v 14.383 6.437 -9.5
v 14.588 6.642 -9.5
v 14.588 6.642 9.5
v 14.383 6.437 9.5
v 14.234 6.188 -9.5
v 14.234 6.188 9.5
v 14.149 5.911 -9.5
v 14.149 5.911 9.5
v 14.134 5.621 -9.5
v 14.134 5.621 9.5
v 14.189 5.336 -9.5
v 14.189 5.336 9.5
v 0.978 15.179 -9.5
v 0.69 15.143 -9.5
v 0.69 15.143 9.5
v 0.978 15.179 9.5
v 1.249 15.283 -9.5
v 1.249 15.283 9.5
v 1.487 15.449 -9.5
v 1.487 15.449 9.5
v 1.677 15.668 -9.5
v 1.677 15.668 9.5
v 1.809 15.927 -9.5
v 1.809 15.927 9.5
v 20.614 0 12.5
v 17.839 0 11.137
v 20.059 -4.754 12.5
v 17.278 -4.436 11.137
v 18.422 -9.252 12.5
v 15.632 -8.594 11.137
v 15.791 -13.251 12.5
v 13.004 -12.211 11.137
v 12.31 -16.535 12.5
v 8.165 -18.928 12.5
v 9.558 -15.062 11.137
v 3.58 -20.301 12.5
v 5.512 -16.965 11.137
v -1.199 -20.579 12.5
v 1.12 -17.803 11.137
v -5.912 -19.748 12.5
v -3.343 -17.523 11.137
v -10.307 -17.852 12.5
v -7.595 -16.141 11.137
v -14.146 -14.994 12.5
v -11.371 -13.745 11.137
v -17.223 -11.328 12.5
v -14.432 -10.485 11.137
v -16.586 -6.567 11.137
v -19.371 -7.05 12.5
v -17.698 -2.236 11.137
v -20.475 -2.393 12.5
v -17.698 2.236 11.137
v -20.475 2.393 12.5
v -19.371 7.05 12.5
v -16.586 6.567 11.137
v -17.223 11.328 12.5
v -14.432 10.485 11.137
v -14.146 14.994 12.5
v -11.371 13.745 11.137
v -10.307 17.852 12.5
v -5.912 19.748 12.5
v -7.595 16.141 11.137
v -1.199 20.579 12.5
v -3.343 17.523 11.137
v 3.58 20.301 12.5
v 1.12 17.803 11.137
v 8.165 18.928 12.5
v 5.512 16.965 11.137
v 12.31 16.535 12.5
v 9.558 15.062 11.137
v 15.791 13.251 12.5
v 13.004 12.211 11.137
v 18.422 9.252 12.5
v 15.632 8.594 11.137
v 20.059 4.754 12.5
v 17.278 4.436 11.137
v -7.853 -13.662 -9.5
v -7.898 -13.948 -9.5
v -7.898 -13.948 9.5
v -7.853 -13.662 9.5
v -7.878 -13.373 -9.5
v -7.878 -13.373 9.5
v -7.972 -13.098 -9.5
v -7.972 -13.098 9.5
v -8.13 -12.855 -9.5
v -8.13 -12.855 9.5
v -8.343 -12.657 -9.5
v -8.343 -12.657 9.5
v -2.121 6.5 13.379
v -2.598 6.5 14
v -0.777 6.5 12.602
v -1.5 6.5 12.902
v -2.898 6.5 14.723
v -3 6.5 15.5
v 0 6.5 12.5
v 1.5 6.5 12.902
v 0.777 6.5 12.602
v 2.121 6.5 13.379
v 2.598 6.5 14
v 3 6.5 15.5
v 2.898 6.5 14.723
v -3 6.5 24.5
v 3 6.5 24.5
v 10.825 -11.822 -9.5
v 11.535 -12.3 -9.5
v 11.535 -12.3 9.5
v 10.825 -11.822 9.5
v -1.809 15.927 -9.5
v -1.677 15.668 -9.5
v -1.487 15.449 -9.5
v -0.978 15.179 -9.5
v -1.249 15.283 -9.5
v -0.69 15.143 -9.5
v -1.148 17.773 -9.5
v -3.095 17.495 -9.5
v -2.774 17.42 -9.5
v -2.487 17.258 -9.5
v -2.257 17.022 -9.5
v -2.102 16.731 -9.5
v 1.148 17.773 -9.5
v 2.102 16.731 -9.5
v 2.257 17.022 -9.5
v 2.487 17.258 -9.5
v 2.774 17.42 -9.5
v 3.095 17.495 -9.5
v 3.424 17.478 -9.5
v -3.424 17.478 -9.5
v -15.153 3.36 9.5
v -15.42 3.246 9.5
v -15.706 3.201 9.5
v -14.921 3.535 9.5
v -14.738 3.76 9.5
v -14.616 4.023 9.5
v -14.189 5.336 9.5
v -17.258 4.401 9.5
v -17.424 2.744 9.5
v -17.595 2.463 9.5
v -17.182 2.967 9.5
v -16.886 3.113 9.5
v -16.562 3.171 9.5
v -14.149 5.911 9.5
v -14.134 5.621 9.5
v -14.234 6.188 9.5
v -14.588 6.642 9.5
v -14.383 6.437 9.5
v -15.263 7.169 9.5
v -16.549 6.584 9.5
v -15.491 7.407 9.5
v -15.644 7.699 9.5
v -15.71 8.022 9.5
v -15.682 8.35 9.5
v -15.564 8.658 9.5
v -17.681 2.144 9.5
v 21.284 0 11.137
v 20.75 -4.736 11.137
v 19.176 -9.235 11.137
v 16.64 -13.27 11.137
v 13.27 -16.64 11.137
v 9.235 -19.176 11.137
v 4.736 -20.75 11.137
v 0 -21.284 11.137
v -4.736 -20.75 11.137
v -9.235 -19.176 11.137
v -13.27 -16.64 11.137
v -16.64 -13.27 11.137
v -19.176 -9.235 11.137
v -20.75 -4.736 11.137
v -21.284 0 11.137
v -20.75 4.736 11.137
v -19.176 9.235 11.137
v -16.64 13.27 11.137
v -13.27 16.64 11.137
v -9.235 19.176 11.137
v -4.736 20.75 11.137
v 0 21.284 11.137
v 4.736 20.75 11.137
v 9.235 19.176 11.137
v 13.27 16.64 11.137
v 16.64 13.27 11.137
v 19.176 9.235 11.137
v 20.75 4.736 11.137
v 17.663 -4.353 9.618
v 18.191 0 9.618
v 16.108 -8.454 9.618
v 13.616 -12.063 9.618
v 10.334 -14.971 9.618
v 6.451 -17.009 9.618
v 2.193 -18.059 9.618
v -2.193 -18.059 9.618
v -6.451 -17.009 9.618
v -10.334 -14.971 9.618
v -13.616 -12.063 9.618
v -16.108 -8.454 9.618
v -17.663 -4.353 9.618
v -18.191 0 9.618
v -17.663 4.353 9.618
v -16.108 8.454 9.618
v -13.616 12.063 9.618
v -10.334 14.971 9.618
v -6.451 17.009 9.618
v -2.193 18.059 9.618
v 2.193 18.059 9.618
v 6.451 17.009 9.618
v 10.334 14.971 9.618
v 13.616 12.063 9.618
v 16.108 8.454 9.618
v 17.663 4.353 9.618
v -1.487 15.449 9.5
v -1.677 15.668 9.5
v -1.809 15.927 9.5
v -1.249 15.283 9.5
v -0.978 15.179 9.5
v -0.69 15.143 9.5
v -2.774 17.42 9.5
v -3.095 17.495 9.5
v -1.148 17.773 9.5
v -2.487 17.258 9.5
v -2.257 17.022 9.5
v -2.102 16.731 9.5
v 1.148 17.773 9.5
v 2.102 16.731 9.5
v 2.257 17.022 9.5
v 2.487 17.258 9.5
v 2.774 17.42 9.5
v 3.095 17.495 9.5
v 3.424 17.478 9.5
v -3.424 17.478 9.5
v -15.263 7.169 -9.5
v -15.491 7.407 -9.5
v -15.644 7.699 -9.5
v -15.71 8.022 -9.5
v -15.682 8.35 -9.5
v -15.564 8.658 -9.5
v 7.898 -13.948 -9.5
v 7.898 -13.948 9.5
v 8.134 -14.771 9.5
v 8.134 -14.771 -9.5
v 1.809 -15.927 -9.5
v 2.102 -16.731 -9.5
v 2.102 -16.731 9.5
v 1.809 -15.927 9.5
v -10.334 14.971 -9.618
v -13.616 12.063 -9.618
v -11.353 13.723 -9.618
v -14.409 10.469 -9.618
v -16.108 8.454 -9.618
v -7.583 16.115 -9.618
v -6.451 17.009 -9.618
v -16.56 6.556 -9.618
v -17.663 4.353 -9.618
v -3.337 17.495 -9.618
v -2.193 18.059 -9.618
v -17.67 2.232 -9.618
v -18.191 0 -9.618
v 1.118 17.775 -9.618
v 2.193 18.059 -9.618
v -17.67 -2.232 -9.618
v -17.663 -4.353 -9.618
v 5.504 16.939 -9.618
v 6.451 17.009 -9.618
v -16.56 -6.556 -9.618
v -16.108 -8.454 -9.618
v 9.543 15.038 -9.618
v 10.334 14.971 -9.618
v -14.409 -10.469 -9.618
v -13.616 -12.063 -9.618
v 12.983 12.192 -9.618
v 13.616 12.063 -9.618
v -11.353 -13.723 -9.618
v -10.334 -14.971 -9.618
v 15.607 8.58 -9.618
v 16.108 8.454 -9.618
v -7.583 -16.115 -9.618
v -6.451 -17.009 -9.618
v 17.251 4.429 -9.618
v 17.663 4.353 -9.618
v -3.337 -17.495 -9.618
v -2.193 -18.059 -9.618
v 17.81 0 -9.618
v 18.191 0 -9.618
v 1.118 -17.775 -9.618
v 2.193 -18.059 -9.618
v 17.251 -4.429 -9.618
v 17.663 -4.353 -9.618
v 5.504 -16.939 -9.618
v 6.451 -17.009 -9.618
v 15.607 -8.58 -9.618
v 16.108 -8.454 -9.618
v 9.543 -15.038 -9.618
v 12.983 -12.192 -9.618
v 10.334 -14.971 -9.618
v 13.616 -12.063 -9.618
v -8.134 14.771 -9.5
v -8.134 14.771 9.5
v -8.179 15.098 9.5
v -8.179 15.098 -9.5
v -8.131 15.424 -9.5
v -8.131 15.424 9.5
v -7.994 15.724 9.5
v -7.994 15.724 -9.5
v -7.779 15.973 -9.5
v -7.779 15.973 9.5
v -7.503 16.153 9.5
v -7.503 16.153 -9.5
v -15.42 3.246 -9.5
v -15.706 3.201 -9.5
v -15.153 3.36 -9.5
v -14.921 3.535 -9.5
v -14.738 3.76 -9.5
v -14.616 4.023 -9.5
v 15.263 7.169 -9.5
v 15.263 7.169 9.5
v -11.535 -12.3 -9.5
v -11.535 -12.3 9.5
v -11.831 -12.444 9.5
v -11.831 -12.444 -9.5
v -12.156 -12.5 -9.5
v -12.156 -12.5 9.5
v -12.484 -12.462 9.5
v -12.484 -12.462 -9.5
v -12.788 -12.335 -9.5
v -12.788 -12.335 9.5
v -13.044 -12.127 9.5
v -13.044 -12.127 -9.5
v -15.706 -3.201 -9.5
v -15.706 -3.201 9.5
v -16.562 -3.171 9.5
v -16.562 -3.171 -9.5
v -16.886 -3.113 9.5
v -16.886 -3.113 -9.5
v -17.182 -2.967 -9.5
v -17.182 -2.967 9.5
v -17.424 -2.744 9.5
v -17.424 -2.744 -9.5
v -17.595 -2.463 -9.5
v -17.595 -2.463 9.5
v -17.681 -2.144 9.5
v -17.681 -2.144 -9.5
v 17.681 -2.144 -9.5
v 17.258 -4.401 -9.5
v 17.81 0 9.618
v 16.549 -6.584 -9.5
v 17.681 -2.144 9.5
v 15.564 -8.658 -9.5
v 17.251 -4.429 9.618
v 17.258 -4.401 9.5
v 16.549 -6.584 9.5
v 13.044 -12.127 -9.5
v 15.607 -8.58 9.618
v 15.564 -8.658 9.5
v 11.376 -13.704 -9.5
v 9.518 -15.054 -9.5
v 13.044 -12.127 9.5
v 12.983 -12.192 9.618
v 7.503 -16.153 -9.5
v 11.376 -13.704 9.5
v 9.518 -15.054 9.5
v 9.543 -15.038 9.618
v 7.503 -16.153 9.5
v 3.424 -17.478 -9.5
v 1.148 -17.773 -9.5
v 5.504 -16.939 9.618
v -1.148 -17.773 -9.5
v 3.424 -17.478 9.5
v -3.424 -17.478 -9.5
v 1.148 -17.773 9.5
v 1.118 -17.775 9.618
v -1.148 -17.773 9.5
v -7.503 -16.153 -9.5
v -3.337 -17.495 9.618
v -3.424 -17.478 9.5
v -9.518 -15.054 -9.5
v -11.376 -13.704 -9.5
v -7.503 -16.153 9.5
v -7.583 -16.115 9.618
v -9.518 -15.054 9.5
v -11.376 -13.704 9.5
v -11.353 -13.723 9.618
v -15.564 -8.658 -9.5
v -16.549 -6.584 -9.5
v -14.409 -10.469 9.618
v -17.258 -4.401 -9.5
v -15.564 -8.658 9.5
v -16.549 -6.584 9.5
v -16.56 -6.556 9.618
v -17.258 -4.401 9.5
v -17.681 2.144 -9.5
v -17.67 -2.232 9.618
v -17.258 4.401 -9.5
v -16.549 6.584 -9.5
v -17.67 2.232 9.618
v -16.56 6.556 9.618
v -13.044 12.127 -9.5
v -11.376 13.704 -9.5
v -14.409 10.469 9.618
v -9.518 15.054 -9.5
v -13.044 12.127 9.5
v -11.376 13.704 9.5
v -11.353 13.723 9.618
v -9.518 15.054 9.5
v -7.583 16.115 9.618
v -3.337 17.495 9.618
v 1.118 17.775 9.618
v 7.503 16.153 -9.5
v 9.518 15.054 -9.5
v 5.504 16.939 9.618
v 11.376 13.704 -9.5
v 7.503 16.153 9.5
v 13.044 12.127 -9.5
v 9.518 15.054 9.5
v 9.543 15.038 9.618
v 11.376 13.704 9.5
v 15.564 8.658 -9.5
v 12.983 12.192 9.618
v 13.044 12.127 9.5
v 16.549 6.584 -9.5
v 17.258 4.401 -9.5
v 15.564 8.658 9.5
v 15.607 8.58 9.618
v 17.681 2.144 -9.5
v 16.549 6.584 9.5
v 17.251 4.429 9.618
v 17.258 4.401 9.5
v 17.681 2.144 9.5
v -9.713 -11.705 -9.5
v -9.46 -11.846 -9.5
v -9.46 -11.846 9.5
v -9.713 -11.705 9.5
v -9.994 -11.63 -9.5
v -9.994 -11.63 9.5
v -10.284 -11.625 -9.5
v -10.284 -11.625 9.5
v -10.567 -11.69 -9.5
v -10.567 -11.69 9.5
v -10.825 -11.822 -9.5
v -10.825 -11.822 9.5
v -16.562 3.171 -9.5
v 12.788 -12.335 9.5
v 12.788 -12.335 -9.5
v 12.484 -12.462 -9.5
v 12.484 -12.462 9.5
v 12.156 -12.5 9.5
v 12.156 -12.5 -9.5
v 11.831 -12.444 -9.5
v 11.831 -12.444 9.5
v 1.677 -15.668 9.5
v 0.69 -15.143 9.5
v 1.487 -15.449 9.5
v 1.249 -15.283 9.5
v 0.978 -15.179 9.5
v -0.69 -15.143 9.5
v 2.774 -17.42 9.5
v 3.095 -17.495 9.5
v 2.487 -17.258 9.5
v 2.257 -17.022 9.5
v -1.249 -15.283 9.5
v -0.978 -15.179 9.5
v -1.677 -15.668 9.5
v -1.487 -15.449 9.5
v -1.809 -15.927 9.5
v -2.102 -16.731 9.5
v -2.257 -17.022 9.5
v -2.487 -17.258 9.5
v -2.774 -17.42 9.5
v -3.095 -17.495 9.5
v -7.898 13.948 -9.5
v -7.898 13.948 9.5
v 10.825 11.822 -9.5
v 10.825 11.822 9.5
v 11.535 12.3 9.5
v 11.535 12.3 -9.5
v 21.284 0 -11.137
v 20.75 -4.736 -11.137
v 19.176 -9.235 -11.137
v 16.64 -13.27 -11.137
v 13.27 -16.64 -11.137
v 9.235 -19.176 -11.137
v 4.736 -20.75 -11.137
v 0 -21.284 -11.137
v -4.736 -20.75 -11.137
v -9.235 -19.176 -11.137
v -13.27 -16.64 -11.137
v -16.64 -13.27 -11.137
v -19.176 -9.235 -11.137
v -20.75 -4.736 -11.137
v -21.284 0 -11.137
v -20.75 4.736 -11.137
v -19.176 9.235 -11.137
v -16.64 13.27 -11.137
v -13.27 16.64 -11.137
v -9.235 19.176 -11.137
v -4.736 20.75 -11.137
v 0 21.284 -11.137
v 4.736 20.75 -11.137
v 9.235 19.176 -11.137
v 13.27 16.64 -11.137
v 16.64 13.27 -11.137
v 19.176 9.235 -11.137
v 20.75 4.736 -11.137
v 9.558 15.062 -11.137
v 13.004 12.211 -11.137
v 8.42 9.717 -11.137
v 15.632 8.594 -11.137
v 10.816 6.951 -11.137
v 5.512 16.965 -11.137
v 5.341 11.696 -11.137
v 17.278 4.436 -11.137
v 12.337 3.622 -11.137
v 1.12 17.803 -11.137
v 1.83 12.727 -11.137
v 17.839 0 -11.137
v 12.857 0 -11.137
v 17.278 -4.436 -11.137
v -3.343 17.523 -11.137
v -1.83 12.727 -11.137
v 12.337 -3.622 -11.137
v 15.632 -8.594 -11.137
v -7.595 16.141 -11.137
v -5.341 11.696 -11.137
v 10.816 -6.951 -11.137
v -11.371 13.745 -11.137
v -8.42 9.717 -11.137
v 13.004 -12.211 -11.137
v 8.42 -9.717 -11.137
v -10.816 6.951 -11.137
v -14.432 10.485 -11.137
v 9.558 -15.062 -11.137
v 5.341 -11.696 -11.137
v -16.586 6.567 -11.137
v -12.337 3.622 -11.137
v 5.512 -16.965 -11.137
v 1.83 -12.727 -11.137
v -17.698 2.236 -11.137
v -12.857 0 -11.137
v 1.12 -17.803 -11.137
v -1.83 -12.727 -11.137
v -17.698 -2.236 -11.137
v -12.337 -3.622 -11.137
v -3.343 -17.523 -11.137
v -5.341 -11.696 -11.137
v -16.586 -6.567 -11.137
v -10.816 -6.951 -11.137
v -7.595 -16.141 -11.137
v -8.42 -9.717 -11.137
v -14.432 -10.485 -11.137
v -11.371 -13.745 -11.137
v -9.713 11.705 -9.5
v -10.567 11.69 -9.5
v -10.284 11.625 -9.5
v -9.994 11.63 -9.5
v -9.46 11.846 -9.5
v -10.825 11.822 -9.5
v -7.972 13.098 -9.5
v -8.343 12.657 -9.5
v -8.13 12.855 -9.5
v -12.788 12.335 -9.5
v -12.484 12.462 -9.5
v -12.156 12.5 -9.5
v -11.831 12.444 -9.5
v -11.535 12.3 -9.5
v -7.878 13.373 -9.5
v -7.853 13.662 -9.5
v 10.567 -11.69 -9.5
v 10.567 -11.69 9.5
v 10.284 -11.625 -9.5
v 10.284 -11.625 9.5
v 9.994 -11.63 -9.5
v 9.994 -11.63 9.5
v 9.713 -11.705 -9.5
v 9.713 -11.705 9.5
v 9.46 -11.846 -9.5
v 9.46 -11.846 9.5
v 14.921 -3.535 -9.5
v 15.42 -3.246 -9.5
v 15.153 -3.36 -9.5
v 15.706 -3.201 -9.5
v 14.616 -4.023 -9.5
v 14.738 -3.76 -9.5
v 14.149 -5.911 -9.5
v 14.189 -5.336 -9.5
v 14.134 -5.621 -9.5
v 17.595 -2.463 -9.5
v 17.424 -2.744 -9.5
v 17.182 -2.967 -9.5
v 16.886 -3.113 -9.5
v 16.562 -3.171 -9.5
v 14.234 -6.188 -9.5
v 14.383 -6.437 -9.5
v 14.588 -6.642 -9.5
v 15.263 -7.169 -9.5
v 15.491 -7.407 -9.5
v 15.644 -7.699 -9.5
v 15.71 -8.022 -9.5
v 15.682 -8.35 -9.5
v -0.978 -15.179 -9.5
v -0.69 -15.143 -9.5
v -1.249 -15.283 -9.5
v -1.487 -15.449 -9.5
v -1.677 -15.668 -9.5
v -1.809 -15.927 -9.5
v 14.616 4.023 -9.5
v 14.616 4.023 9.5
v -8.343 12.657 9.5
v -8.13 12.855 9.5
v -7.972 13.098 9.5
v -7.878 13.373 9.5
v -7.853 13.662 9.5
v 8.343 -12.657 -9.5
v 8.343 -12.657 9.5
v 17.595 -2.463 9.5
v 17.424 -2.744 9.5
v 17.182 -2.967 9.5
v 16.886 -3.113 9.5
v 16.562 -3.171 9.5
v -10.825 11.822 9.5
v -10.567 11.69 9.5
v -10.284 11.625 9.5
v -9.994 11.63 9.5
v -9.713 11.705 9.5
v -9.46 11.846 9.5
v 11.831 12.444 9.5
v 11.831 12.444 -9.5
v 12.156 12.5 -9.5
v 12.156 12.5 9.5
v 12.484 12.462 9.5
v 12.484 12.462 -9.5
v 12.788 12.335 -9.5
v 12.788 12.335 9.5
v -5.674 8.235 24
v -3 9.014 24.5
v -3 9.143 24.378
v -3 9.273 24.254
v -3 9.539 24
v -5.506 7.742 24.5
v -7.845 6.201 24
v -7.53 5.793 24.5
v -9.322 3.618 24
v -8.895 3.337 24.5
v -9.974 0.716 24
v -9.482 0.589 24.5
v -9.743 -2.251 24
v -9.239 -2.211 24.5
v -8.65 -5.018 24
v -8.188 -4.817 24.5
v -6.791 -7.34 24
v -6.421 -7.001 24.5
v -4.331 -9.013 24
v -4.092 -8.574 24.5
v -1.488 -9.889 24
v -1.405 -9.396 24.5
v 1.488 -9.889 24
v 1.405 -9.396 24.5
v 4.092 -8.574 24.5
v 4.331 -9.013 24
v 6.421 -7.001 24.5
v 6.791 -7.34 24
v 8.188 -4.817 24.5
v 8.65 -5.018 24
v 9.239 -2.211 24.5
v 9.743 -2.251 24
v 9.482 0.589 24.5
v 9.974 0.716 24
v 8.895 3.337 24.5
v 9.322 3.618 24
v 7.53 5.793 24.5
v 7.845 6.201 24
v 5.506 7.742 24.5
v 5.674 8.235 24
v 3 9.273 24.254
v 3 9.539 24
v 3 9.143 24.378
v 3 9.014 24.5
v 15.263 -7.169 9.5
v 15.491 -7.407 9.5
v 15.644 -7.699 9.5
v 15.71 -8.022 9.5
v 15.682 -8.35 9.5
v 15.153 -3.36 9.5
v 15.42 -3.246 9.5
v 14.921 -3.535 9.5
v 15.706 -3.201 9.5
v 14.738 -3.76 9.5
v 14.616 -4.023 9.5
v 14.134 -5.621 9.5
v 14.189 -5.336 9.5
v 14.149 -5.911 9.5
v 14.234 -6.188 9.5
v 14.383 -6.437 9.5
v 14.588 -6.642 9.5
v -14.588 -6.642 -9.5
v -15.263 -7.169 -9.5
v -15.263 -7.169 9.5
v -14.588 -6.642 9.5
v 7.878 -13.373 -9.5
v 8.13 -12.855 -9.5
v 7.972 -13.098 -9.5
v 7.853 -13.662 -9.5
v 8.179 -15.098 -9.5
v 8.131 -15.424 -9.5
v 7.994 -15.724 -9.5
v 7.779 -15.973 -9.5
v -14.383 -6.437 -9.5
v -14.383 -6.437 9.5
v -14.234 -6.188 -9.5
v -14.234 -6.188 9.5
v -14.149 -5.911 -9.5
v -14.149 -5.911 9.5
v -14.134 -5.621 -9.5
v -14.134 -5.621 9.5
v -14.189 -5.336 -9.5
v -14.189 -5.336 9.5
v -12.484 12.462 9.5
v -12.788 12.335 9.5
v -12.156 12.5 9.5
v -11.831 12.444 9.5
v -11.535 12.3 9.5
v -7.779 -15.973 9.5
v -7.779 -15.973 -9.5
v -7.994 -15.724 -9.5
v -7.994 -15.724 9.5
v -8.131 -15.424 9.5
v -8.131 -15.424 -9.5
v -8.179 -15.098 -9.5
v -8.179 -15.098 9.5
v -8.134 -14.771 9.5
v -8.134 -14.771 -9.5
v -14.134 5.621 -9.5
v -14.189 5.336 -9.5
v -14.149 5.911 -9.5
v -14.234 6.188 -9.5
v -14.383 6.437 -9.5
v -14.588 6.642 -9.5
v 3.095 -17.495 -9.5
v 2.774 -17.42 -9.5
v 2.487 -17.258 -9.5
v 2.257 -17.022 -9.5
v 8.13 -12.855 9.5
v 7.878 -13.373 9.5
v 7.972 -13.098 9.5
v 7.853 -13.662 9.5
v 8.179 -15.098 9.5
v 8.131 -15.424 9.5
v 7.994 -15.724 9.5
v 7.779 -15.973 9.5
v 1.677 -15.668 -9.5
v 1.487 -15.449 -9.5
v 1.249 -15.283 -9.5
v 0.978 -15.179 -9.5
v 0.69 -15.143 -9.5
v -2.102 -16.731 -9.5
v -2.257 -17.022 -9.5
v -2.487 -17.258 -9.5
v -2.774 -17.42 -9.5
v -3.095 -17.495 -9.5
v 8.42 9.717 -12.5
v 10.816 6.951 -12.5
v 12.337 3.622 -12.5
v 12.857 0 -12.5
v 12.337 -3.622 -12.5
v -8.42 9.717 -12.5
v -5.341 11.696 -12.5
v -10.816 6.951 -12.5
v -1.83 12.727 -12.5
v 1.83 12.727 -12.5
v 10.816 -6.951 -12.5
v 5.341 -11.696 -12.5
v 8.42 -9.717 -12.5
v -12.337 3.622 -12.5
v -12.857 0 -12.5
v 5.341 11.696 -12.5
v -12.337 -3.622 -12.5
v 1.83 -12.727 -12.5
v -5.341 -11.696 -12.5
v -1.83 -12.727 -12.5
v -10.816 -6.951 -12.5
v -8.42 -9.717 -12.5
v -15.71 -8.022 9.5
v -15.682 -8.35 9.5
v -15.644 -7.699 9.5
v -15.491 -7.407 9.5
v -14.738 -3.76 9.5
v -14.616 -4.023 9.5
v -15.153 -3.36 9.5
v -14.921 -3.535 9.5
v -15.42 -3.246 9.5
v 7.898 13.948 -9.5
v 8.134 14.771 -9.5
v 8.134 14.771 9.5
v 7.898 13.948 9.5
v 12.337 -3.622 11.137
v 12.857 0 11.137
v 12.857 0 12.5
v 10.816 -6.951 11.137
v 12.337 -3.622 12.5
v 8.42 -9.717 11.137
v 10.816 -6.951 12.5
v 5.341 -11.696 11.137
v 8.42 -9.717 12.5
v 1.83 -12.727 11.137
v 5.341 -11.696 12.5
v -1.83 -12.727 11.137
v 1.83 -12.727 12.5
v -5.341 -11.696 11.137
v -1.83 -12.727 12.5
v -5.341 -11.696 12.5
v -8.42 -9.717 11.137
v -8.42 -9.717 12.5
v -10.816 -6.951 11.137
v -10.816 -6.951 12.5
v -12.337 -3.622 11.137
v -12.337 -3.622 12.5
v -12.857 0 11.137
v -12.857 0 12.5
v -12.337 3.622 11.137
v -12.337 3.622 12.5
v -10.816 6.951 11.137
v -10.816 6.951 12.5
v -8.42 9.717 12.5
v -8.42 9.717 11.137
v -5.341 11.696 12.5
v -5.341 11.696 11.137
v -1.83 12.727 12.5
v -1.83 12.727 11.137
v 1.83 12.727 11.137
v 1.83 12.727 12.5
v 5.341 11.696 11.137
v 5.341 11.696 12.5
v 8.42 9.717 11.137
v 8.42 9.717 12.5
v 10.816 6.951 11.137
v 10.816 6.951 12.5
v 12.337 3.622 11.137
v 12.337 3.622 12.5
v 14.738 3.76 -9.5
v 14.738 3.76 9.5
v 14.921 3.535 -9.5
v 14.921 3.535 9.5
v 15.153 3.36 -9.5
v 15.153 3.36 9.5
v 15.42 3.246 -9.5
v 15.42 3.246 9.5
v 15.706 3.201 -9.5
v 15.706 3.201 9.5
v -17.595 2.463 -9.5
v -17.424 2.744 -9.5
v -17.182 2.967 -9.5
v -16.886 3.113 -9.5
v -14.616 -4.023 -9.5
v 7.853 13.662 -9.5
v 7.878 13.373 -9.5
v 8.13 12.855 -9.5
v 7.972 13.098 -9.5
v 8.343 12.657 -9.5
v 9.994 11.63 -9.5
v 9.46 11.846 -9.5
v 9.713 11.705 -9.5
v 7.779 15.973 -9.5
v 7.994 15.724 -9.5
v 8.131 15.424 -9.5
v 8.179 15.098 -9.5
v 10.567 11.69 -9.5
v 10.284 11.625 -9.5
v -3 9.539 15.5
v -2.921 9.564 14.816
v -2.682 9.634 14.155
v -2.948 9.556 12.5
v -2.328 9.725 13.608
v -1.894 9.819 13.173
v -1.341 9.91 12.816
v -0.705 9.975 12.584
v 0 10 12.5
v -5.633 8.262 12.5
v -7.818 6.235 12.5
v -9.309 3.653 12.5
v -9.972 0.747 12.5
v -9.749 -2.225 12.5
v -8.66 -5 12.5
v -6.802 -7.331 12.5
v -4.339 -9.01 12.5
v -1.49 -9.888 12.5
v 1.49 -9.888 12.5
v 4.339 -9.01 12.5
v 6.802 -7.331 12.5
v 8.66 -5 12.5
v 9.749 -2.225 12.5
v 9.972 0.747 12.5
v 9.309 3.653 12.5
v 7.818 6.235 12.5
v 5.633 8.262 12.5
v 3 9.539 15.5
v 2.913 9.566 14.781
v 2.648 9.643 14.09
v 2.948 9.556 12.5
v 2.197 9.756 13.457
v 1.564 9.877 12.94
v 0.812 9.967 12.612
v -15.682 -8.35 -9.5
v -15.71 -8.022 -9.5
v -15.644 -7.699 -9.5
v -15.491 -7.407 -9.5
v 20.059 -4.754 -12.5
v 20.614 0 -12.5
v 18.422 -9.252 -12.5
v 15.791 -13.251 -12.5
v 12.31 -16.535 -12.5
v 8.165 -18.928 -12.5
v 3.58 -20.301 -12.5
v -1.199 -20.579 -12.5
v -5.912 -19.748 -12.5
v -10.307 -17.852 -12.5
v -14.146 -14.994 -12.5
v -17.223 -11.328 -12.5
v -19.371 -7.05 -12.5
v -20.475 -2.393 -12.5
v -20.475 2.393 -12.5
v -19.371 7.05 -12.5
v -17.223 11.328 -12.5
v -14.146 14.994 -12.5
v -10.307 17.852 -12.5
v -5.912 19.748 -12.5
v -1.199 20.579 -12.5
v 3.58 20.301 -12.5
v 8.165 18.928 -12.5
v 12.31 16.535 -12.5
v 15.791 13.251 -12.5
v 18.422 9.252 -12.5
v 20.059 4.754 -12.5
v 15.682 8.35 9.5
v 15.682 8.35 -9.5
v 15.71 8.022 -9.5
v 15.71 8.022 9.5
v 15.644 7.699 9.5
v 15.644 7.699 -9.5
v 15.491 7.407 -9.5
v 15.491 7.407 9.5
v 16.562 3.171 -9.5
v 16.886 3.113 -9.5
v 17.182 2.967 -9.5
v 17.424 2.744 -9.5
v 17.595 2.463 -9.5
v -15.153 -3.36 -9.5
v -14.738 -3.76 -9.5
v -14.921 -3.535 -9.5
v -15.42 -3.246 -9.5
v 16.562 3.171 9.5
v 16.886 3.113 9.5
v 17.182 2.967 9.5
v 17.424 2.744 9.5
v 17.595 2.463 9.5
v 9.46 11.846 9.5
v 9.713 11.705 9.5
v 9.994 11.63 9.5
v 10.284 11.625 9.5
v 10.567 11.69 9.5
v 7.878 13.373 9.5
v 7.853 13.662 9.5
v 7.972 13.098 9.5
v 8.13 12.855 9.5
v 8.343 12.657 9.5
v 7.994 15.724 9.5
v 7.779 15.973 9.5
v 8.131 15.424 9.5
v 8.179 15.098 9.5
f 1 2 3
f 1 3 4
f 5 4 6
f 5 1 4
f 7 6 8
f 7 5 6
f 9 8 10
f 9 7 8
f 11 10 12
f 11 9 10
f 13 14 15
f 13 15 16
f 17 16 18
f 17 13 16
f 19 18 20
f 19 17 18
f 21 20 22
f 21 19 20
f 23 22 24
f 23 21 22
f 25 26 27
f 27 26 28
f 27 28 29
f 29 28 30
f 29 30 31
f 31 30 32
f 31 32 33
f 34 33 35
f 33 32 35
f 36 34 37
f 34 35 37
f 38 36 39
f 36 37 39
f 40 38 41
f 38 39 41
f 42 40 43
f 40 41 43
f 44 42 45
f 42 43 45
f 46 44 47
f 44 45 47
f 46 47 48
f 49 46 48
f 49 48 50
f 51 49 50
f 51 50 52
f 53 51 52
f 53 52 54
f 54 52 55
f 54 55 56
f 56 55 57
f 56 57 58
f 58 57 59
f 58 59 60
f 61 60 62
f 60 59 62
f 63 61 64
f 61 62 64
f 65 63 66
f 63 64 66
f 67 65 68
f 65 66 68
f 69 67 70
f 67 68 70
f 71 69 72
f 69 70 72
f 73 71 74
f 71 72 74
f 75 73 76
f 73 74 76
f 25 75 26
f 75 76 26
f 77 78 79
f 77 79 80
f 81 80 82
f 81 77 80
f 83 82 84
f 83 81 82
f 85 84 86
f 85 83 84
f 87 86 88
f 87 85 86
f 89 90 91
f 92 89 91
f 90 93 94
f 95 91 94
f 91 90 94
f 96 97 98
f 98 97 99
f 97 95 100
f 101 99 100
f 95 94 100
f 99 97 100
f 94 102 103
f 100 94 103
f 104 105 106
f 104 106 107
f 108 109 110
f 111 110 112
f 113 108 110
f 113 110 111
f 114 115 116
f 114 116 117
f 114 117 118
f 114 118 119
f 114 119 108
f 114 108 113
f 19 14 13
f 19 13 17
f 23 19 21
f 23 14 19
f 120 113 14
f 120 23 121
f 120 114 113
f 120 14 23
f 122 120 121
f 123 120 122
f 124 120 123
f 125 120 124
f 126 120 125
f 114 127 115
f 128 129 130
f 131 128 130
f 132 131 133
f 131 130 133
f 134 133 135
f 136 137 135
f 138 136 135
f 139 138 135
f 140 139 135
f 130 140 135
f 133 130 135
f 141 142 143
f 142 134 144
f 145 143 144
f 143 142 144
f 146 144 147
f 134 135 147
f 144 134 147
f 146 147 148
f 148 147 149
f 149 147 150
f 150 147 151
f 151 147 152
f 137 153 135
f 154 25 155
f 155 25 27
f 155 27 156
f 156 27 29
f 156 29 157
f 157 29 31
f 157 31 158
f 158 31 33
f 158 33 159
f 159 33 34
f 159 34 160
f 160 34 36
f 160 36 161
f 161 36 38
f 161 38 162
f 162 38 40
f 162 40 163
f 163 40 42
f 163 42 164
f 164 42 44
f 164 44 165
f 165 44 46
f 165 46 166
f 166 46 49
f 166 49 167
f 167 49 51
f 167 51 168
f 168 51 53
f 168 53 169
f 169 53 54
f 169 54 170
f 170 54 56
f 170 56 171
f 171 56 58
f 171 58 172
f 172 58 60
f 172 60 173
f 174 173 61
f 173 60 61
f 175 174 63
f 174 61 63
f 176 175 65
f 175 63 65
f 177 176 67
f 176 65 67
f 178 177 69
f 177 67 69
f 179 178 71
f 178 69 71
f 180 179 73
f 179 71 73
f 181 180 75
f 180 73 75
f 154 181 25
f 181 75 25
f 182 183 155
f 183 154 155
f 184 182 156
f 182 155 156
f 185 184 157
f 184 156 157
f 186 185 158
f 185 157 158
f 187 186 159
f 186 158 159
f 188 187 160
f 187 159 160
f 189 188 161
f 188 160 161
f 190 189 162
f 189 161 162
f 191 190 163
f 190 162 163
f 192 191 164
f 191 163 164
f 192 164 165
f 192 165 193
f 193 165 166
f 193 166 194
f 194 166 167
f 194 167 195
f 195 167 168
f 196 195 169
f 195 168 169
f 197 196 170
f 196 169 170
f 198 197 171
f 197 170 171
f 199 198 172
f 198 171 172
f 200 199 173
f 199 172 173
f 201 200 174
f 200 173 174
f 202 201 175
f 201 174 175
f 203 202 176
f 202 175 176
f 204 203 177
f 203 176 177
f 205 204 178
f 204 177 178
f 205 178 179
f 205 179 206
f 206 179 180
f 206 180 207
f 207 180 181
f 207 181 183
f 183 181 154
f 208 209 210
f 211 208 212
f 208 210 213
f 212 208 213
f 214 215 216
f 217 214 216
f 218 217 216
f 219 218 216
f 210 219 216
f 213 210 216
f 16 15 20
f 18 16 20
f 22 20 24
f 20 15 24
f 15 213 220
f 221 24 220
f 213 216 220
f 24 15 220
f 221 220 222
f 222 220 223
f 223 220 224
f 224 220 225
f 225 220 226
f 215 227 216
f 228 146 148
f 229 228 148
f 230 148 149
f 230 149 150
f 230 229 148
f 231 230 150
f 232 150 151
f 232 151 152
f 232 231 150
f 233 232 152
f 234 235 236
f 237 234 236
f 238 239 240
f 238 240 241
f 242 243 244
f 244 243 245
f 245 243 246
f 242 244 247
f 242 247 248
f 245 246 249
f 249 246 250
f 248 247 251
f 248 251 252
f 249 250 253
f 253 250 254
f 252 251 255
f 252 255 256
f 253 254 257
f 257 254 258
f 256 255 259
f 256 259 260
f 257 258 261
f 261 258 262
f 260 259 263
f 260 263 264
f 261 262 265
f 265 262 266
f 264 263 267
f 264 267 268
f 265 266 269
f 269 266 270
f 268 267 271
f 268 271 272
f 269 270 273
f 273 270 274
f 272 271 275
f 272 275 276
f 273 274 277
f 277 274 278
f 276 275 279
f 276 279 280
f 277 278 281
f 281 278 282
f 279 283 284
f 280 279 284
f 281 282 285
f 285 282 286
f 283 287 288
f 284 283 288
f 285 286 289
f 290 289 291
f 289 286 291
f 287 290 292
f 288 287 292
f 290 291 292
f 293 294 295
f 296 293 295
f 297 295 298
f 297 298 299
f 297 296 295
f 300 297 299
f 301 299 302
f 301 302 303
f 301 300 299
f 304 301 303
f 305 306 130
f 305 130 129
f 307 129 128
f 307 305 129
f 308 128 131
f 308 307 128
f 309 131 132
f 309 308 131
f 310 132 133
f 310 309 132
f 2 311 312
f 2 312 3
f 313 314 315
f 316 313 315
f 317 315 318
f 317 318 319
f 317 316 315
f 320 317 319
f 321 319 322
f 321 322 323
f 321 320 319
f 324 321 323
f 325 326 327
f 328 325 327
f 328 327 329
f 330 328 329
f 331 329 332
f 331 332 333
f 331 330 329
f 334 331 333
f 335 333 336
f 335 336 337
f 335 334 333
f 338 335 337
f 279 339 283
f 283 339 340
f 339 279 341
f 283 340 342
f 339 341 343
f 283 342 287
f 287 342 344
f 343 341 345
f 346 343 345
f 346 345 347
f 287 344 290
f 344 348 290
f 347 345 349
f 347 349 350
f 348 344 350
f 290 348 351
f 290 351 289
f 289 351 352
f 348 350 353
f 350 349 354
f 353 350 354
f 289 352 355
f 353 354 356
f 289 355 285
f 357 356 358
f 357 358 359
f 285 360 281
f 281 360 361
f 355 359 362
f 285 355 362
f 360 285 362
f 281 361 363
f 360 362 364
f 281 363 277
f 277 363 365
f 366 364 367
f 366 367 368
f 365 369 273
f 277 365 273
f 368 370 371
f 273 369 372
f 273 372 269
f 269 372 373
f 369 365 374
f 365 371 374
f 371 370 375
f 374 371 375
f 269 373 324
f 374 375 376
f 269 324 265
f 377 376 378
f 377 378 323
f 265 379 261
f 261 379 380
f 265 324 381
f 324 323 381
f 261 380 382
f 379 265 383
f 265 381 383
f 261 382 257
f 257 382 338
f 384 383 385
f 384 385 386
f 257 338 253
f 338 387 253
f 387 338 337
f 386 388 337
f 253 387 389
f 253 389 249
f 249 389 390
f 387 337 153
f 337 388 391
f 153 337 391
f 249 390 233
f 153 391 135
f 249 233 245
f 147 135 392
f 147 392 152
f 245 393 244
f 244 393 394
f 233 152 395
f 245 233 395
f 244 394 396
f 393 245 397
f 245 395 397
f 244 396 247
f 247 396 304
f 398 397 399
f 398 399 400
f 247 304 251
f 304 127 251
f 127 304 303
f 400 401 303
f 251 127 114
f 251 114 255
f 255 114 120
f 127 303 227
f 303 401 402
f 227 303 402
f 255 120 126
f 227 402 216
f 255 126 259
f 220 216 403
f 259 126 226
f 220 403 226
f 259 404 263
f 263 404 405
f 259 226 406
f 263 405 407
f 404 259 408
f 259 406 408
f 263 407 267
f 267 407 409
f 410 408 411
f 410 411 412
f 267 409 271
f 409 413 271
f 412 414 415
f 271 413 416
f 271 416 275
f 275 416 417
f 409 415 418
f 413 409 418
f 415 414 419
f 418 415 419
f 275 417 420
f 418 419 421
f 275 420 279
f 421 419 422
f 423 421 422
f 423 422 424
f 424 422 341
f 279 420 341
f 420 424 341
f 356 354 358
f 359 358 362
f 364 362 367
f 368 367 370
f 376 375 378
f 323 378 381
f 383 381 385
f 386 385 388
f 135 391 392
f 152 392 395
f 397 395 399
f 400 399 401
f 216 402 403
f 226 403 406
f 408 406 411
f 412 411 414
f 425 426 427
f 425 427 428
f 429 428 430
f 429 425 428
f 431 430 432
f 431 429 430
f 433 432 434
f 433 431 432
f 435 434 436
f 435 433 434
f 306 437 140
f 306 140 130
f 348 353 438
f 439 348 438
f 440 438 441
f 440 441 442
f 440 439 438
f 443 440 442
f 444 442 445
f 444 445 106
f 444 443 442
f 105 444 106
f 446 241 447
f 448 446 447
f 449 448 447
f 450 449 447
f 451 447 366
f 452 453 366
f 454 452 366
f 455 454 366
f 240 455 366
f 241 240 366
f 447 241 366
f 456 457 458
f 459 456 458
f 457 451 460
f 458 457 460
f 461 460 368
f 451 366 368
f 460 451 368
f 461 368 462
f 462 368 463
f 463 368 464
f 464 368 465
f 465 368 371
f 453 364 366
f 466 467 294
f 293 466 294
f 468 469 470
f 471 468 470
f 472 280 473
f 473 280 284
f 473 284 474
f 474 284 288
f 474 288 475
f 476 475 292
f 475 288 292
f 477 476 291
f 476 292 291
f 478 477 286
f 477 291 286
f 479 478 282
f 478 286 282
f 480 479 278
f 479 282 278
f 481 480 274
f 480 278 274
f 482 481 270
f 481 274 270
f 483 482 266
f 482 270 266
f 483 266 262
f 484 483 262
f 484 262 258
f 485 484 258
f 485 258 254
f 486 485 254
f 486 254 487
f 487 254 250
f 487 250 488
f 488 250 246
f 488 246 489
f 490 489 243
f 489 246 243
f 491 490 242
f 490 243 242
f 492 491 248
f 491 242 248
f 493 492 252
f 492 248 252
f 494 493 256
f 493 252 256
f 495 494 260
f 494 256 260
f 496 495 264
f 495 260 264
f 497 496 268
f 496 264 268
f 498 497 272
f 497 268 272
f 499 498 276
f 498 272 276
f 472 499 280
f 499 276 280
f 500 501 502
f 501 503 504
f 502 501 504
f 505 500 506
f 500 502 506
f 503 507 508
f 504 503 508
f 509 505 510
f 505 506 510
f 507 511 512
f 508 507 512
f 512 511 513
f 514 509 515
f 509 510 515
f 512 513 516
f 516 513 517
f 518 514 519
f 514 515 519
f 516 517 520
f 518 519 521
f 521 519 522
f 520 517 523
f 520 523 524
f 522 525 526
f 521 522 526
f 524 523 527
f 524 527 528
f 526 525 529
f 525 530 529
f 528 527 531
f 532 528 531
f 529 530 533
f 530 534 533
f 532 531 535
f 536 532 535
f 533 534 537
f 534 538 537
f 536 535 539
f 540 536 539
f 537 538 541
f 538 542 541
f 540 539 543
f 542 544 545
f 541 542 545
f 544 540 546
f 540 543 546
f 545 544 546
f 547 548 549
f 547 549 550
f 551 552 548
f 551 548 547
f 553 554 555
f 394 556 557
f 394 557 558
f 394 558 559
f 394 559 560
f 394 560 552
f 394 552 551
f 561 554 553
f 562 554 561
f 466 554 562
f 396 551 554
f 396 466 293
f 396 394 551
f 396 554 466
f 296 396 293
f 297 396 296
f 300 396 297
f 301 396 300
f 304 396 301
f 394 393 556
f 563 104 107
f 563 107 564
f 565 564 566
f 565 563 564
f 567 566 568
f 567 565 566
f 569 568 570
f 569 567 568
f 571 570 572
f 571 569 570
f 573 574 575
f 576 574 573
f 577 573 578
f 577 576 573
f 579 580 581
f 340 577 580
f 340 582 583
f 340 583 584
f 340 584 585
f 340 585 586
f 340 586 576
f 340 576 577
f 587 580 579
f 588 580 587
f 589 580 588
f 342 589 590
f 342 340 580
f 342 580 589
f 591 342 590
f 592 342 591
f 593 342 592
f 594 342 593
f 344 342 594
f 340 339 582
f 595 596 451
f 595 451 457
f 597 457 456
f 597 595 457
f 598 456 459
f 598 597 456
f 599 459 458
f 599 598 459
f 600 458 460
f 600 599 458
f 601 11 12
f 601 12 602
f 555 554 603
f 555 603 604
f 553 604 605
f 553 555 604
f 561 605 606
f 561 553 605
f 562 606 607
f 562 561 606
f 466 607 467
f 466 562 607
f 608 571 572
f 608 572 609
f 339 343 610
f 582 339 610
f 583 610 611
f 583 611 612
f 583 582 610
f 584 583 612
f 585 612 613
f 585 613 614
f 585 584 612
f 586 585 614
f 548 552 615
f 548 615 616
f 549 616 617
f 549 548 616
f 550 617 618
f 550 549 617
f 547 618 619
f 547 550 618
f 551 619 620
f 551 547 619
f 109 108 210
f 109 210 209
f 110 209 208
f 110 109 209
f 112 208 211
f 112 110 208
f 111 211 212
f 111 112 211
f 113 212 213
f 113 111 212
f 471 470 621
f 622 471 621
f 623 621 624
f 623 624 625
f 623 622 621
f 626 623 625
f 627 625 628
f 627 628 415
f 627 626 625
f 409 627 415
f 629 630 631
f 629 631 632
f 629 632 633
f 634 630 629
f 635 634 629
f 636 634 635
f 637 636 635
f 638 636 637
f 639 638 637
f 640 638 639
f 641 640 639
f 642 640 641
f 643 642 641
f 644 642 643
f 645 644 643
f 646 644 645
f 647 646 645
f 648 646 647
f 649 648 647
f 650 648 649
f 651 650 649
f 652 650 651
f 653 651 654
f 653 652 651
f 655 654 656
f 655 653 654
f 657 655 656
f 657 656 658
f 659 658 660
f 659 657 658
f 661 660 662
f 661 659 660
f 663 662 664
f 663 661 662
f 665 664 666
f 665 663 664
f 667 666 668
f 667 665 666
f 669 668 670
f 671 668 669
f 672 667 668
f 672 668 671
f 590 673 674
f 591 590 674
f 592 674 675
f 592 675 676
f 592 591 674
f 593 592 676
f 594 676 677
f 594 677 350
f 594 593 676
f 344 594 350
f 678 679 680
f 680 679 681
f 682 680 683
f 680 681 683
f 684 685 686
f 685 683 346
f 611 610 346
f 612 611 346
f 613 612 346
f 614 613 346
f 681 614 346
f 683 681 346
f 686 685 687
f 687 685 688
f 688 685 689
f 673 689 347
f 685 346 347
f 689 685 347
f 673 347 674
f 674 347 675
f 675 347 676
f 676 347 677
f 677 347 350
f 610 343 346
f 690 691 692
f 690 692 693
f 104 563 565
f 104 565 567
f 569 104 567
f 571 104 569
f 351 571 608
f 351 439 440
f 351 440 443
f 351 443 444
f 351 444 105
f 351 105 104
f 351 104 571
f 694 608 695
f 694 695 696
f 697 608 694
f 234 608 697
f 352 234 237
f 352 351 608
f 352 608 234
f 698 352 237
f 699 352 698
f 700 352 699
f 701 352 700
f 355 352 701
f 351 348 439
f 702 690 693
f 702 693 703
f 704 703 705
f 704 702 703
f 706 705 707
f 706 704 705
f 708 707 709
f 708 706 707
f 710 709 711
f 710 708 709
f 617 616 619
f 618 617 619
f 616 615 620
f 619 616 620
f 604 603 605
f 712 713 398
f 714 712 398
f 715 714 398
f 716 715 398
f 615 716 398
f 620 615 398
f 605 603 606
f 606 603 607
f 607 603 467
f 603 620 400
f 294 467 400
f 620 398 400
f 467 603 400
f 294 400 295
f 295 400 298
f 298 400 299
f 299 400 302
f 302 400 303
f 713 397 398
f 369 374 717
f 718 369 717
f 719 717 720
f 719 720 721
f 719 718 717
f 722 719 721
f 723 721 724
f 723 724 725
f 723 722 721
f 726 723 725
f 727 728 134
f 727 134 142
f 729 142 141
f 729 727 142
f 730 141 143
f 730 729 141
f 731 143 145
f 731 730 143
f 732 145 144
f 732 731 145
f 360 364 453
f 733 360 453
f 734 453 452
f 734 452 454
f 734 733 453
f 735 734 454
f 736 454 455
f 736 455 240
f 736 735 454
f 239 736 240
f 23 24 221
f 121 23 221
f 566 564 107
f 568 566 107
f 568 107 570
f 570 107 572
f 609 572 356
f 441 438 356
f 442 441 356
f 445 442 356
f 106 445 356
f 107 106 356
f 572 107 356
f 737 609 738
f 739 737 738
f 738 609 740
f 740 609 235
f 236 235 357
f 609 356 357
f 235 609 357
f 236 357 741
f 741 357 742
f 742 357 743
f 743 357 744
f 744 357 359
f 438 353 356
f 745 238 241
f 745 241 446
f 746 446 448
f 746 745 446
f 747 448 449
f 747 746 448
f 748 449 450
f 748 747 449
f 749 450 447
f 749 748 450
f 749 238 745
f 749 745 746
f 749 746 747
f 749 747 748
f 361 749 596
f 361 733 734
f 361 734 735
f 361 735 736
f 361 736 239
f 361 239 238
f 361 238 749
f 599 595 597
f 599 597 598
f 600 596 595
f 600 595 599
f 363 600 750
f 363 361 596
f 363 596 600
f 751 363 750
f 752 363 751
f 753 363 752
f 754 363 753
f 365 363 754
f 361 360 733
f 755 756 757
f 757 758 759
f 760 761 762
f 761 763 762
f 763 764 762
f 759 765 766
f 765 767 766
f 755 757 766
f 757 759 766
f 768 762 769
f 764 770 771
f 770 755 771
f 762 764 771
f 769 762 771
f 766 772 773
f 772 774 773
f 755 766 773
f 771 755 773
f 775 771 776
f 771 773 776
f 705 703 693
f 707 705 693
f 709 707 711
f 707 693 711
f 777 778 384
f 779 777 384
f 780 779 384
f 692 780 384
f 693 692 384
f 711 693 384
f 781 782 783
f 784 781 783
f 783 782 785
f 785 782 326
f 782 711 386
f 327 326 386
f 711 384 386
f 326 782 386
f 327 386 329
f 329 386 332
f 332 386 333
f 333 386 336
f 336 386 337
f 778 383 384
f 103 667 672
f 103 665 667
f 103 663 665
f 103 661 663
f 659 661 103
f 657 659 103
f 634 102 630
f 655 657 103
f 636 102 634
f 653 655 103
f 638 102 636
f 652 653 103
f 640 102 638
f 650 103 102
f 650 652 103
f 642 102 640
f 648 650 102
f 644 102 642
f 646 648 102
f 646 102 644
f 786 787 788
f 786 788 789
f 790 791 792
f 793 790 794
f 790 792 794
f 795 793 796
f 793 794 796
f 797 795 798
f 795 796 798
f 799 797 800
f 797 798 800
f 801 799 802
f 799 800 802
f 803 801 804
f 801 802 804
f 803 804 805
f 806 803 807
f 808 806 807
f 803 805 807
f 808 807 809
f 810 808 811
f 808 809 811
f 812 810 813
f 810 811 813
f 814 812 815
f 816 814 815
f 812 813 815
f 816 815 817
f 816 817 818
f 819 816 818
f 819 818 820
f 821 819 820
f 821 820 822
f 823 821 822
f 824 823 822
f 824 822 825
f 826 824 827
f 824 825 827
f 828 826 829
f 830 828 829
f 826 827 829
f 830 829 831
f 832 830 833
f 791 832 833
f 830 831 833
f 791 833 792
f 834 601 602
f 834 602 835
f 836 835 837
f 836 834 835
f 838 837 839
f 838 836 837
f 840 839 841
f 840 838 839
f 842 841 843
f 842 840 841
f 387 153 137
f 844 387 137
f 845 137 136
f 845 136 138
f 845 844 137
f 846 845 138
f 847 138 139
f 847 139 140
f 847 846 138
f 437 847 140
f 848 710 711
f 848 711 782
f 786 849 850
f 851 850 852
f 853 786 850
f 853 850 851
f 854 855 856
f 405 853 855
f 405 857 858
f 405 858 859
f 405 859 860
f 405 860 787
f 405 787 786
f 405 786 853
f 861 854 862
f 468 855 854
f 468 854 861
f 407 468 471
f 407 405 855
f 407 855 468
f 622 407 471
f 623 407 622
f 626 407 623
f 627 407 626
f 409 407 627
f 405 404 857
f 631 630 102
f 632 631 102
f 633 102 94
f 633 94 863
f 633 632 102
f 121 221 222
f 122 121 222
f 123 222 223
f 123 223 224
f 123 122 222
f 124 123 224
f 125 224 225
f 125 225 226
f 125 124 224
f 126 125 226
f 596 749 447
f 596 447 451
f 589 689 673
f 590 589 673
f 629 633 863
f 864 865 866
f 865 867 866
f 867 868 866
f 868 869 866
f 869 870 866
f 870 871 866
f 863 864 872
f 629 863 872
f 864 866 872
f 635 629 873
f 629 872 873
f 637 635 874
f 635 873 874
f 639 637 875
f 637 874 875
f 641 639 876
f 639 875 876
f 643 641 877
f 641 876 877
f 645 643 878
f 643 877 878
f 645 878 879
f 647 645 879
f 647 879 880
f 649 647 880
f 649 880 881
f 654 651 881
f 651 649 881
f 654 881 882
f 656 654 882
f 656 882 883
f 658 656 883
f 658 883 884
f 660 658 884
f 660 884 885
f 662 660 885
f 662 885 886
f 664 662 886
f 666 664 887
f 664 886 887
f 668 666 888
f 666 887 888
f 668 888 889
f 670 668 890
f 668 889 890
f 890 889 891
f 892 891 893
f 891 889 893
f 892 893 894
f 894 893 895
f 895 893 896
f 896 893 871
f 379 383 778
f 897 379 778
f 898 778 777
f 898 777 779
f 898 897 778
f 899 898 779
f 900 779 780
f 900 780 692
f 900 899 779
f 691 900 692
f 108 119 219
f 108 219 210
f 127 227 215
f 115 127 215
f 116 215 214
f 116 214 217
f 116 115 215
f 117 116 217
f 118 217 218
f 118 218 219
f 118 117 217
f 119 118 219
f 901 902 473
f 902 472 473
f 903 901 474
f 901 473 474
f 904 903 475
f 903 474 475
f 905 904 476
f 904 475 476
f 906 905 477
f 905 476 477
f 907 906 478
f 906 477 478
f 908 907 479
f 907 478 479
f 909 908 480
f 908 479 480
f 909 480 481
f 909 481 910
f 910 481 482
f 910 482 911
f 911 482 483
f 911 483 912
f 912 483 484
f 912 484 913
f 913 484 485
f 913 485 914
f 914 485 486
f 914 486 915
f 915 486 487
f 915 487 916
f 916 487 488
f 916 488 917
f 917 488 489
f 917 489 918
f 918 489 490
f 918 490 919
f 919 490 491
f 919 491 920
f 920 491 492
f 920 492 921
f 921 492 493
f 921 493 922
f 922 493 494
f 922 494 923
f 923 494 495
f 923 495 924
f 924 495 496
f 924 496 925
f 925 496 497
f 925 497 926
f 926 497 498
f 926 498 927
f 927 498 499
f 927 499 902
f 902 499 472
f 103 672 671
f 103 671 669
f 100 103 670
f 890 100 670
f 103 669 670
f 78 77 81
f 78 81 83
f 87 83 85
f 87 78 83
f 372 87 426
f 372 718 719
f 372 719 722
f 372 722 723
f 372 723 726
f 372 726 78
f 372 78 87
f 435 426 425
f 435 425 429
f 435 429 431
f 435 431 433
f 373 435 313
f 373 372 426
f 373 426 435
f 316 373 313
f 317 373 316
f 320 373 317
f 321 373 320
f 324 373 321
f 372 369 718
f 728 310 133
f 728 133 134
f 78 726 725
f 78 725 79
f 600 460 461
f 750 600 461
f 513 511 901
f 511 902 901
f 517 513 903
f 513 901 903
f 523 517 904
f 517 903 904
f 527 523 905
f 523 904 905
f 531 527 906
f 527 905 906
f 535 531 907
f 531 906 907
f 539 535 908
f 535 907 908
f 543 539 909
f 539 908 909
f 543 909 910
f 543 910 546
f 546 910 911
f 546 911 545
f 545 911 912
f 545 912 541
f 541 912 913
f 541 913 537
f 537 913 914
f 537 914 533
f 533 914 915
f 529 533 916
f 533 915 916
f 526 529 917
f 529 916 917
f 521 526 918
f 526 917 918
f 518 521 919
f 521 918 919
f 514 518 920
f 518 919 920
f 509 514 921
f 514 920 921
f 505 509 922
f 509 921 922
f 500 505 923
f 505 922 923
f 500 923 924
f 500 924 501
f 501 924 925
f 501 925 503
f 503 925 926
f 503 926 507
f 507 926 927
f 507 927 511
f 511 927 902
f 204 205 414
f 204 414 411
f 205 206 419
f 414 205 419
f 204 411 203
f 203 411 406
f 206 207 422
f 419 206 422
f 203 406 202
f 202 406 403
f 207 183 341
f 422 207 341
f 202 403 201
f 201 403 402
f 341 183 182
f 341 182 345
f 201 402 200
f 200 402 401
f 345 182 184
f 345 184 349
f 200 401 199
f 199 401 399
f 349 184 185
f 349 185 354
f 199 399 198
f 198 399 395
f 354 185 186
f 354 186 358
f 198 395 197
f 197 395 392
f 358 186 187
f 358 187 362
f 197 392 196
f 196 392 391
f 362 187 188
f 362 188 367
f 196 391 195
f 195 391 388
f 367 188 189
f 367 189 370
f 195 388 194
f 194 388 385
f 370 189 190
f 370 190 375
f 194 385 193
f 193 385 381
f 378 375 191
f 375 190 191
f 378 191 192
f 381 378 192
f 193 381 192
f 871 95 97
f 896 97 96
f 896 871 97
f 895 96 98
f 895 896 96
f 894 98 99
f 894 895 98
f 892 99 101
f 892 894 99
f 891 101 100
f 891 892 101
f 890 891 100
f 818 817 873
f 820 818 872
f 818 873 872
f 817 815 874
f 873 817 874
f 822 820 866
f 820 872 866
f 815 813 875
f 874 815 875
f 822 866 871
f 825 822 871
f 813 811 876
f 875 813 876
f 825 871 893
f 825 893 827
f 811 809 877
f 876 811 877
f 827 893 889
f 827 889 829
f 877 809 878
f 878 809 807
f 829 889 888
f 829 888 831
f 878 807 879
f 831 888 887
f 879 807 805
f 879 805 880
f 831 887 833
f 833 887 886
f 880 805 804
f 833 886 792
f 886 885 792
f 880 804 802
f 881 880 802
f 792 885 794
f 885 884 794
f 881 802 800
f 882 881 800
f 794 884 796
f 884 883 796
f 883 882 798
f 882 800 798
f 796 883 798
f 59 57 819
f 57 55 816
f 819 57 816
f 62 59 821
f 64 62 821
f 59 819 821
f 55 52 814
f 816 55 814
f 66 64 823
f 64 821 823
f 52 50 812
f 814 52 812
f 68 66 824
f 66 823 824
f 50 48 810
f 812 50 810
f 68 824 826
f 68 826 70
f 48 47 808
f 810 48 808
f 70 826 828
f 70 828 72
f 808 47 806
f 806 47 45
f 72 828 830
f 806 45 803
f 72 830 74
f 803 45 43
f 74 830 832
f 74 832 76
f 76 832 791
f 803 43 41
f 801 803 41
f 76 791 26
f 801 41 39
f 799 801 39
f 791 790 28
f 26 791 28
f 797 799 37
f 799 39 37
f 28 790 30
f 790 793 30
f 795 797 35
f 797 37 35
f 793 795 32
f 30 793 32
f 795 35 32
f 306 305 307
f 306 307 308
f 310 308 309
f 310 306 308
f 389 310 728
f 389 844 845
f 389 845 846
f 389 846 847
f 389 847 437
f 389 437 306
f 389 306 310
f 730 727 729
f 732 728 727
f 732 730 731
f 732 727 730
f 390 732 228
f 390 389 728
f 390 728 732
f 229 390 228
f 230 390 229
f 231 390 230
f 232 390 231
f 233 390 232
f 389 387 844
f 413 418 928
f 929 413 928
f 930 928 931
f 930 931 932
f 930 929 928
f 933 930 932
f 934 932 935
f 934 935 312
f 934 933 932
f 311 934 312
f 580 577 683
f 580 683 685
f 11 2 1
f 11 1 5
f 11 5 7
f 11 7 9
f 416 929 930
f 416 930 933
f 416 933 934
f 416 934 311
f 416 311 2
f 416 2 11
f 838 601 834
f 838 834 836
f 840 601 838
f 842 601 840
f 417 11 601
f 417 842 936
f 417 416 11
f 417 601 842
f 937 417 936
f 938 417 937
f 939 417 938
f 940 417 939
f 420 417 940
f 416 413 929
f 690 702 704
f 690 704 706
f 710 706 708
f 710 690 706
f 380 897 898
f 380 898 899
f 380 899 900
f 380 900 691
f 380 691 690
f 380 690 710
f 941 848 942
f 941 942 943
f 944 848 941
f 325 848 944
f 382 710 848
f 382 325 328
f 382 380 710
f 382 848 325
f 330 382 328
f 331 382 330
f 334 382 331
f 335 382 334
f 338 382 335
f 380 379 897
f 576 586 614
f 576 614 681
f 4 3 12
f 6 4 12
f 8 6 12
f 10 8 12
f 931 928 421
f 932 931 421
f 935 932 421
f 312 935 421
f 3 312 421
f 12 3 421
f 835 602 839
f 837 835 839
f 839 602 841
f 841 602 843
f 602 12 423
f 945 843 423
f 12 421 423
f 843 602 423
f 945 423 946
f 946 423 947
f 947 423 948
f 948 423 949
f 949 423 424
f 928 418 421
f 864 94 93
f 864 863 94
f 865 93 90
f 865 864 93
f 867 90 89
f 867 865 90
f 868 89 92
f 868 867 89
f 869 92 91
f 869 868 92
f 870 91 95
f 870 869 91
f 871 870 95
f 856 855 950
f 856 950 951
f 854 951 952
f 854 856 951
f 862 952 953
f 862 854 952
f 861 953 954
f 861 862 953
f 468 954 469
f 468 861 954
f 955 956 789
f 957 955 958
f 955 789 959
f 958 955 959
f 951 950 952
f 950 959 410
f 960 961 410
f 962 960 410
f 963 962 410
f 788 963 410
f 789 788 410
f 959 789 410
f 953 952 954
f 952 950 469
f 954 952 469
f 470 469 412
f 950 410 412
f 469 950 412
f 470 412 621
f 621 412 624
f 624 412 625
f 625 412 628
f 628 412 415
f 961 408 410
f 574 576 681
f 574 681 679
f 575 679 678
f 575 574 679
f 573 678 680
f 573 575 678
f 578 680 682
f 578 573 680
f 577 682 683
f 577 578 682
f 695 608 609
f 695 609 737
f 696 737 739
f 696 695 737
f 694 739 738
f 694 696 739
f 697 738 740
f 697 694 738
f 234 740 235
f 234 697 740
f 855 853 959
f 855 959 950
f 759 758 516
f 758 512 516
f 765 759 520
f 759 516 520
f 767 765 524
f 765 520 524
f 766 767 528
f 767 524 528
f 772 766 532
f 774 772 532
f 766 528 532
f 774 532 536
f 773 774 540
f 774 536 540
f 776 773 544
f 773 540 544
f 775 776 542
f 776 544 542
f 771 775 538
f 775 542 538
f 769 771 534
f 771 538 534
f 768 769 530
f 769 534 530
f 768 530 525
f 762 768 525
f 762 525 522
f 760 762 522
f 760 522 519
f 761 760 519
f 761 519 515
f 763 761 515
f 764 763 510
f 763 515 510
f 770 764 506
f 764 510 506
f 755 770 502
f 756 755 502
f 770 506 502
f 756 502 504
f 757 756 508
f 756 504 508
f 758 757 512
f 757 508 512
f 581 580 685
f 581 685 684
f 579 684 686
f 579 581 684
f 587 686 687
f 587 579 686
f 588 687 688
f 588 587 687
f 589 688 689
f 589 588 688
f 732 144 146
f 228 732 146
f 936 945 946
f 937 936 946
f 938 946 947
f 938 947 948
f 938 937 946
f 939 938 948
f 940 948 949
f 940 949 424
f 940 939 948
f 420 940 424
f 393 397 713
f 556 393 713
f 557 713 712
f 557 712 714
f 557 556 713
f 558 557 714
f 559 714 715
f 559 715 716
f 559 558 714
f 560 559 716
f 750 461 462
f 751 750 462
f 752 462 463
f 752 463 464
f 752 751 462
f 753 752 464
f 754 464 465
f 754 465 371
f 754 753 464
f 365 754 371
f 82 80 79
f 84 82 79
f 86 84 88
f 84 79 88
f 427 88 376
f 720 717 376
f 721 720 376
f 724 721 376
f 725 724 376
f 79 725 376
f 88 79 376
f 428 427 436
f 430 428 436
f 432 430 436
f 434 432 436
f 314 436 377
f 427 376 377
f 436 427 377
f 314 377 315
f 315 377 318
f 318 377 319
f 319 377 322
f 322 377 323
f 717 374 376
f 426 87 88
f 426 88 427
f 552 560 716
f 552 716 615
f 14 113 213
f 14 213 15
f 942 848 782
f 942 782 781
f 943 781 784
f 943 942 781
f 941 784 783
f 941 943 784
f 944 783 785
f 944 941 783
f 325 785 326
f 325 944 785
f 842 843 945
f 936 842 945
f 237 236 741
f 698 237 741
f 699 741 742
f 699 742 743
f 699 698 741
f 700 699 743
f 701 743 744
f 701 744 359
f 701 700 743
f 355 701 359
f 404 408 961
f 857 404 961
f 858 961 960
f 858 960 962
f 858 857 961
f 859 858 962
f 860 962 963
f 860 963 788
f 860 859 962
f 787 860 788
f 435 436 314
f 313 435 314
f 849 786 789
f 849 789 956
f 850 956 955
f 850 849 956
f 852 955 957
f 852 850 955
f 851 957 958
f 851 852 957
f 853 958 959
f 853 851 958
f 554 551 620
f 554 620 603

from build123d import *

# Parameters (mm, degrees)
TOOTH_EXTRUDE_START      = -9.5
TOOTH_EXTRUDE_DEPTH      = 19
PATTERN_CIRCULAR_1_COUNT = 10
SKETCH_3_R               = 10
EXTRUDE_1_DEPTH          = 12
CHAMFER_1_SIZE           = 0.5
SKETCH_4_W               = 6
SKETCH_4_H               = 7
CUT_EXTRUDE_1_DEPTH      = 12
FILLET_1_R               = 3


with BuildPart() as part:
    # GearBelt-BaseSketch → 0.375in Pitch 'L', 0.500in Belt Width, 36.3828mm P.D. (revolve)
    with BuildSketch(Plane(origin=(0, 0, 0), x_dir=(0, 0, -1), z_dir=(1, 0, 0)), mode=Mode.PRIVATE) as f_0_375in_pitch_l_0_500in_belt_width_36_sk:
        Polygon((-12.5, 0), (12.5, 0), (12.5, 12.857409477), (11.136655608, 12.857409477), (11.136655608, 17.838520326), (12.5, 20.614224723), (11.136655777, 21.283859322), (9.617735592, 18.191410003), (9.617735592, 17.810409995), (-9.617735592, 17.810409995), (-9.617735592, 18.191410003), (-11.136655777, 21.283859322), (-12.5, 20.614224723), (-11.136655608, 17.838520326), (-11.136655608, 12.857409477), (-12.5, 12.857409477), align=None)
    revolve(f_0_375in_pitch_l_0_500in_belt_width_36_sk.sketch.rotate(Axis((0, 0, 14.2875), (0, 0, -1)), 90), axis=Axis((0, 0, 14.2875), (0, 0, -1)))

    # Tooth-Sketch → Tooth-Extrude (cut)
    with BuildSketch(Plane.XY.offset(TOOTH_EXTRUDE_START)):
        with BuildLine():
            Line((-0.690315485, 15.14340994), (0.690315485, 15.14340994))
            ThreePointArc((0.690315485, 15.14340994), (1.373229902, 15.358732029), (1.809136966, 15.926817177))
            Line((1.809136966, 15.926817177), (2.101875716, 16.731110287))
            ThreePointArc((2.101875716, 16.731110287), (2.625223607, 17.348846453), (3.424464642, 17.478093321))
            Line((3.424464642, 17.478093321), (3.424464642, 20.018093321))
            Line((3.424464642, 20.018093321), (-3.424464642, 20.018093321))
            Line((-3.424464642, 20.018093321), (-3.424464642, 17.478093321))
            ThreePointArc((-3.424464642, 17.478093321), (-2.625223607, 17.348846453), (-2.101875716, 16.731110287))
            Line((-2.101875716, 16.731110287), (-1.809136966, 15.926817177))
            ThreePointArc((-1.809136966, 15.926817177), (-1.373229902, 15.358732029), (-0.690315485, 15.14340994))
        make_face()
    tooth_extrude = extrude(amount=TOOTH_EXTRUDE_DEPTH, mode=Mode.SUBTRACT)

    # 阵列(圆周)1: Tooth-Extrude ×10 about axis
    pattern_circular_1_axis = Axis((0, 0, 0), (0, 0, 1))
    for i in range(1, PATTERN_CIRCULAR_1_COUNT):
        add(tooth_extrude.rotate(pattern_circular_1_axis, i * 360 / PATTERN_CIRCULAR_1_COUNT), mode=Mode.SUBTRACT)

    # 草图3 → 凸台-拉伸1 (add)
    with BuildSketch(Plane.XY.offset(12.5)):
        with Locations(Location((0, 0, 0), (0, 0, 180))):
            Circle(SKETCH_3_R)
    extrude(amount=EXTRUDE_1_DEPTH)

    # 倒角1
    chamfer_1_edges = [part.edges().sort_by_distance(p)[0] for p in [
        (10, 0, 24.5),
    ]]
    chamfer(chamfer_1_edges, length=CHAMFER_1_SIZE)

    # 草图4 → 切除-拉伸1 (cut)
    with BuildSketch(Plane.XY.offset(24.5)):
        with Locations((0, 10)):
            Rectangle(SKETCH_4_W, SKETCH_4_H)
    extrude(amount=-CUT_EXTRUDE_1_DEPTH, mode=Mode.SUBTRACT)

    # 圆角1
    fillet_1_edges = [part.edges().sort_by_distance(p)[0] for p in [
        (-3, 8.019696007, 12.5),
        (3, 8.019696007, 12.5),
    ]]
    fillet(fillet_1_edges, radius=FILLET_1_R - 0.0001)  # a hair under: the kernel refuses the full size


solid = part.part
